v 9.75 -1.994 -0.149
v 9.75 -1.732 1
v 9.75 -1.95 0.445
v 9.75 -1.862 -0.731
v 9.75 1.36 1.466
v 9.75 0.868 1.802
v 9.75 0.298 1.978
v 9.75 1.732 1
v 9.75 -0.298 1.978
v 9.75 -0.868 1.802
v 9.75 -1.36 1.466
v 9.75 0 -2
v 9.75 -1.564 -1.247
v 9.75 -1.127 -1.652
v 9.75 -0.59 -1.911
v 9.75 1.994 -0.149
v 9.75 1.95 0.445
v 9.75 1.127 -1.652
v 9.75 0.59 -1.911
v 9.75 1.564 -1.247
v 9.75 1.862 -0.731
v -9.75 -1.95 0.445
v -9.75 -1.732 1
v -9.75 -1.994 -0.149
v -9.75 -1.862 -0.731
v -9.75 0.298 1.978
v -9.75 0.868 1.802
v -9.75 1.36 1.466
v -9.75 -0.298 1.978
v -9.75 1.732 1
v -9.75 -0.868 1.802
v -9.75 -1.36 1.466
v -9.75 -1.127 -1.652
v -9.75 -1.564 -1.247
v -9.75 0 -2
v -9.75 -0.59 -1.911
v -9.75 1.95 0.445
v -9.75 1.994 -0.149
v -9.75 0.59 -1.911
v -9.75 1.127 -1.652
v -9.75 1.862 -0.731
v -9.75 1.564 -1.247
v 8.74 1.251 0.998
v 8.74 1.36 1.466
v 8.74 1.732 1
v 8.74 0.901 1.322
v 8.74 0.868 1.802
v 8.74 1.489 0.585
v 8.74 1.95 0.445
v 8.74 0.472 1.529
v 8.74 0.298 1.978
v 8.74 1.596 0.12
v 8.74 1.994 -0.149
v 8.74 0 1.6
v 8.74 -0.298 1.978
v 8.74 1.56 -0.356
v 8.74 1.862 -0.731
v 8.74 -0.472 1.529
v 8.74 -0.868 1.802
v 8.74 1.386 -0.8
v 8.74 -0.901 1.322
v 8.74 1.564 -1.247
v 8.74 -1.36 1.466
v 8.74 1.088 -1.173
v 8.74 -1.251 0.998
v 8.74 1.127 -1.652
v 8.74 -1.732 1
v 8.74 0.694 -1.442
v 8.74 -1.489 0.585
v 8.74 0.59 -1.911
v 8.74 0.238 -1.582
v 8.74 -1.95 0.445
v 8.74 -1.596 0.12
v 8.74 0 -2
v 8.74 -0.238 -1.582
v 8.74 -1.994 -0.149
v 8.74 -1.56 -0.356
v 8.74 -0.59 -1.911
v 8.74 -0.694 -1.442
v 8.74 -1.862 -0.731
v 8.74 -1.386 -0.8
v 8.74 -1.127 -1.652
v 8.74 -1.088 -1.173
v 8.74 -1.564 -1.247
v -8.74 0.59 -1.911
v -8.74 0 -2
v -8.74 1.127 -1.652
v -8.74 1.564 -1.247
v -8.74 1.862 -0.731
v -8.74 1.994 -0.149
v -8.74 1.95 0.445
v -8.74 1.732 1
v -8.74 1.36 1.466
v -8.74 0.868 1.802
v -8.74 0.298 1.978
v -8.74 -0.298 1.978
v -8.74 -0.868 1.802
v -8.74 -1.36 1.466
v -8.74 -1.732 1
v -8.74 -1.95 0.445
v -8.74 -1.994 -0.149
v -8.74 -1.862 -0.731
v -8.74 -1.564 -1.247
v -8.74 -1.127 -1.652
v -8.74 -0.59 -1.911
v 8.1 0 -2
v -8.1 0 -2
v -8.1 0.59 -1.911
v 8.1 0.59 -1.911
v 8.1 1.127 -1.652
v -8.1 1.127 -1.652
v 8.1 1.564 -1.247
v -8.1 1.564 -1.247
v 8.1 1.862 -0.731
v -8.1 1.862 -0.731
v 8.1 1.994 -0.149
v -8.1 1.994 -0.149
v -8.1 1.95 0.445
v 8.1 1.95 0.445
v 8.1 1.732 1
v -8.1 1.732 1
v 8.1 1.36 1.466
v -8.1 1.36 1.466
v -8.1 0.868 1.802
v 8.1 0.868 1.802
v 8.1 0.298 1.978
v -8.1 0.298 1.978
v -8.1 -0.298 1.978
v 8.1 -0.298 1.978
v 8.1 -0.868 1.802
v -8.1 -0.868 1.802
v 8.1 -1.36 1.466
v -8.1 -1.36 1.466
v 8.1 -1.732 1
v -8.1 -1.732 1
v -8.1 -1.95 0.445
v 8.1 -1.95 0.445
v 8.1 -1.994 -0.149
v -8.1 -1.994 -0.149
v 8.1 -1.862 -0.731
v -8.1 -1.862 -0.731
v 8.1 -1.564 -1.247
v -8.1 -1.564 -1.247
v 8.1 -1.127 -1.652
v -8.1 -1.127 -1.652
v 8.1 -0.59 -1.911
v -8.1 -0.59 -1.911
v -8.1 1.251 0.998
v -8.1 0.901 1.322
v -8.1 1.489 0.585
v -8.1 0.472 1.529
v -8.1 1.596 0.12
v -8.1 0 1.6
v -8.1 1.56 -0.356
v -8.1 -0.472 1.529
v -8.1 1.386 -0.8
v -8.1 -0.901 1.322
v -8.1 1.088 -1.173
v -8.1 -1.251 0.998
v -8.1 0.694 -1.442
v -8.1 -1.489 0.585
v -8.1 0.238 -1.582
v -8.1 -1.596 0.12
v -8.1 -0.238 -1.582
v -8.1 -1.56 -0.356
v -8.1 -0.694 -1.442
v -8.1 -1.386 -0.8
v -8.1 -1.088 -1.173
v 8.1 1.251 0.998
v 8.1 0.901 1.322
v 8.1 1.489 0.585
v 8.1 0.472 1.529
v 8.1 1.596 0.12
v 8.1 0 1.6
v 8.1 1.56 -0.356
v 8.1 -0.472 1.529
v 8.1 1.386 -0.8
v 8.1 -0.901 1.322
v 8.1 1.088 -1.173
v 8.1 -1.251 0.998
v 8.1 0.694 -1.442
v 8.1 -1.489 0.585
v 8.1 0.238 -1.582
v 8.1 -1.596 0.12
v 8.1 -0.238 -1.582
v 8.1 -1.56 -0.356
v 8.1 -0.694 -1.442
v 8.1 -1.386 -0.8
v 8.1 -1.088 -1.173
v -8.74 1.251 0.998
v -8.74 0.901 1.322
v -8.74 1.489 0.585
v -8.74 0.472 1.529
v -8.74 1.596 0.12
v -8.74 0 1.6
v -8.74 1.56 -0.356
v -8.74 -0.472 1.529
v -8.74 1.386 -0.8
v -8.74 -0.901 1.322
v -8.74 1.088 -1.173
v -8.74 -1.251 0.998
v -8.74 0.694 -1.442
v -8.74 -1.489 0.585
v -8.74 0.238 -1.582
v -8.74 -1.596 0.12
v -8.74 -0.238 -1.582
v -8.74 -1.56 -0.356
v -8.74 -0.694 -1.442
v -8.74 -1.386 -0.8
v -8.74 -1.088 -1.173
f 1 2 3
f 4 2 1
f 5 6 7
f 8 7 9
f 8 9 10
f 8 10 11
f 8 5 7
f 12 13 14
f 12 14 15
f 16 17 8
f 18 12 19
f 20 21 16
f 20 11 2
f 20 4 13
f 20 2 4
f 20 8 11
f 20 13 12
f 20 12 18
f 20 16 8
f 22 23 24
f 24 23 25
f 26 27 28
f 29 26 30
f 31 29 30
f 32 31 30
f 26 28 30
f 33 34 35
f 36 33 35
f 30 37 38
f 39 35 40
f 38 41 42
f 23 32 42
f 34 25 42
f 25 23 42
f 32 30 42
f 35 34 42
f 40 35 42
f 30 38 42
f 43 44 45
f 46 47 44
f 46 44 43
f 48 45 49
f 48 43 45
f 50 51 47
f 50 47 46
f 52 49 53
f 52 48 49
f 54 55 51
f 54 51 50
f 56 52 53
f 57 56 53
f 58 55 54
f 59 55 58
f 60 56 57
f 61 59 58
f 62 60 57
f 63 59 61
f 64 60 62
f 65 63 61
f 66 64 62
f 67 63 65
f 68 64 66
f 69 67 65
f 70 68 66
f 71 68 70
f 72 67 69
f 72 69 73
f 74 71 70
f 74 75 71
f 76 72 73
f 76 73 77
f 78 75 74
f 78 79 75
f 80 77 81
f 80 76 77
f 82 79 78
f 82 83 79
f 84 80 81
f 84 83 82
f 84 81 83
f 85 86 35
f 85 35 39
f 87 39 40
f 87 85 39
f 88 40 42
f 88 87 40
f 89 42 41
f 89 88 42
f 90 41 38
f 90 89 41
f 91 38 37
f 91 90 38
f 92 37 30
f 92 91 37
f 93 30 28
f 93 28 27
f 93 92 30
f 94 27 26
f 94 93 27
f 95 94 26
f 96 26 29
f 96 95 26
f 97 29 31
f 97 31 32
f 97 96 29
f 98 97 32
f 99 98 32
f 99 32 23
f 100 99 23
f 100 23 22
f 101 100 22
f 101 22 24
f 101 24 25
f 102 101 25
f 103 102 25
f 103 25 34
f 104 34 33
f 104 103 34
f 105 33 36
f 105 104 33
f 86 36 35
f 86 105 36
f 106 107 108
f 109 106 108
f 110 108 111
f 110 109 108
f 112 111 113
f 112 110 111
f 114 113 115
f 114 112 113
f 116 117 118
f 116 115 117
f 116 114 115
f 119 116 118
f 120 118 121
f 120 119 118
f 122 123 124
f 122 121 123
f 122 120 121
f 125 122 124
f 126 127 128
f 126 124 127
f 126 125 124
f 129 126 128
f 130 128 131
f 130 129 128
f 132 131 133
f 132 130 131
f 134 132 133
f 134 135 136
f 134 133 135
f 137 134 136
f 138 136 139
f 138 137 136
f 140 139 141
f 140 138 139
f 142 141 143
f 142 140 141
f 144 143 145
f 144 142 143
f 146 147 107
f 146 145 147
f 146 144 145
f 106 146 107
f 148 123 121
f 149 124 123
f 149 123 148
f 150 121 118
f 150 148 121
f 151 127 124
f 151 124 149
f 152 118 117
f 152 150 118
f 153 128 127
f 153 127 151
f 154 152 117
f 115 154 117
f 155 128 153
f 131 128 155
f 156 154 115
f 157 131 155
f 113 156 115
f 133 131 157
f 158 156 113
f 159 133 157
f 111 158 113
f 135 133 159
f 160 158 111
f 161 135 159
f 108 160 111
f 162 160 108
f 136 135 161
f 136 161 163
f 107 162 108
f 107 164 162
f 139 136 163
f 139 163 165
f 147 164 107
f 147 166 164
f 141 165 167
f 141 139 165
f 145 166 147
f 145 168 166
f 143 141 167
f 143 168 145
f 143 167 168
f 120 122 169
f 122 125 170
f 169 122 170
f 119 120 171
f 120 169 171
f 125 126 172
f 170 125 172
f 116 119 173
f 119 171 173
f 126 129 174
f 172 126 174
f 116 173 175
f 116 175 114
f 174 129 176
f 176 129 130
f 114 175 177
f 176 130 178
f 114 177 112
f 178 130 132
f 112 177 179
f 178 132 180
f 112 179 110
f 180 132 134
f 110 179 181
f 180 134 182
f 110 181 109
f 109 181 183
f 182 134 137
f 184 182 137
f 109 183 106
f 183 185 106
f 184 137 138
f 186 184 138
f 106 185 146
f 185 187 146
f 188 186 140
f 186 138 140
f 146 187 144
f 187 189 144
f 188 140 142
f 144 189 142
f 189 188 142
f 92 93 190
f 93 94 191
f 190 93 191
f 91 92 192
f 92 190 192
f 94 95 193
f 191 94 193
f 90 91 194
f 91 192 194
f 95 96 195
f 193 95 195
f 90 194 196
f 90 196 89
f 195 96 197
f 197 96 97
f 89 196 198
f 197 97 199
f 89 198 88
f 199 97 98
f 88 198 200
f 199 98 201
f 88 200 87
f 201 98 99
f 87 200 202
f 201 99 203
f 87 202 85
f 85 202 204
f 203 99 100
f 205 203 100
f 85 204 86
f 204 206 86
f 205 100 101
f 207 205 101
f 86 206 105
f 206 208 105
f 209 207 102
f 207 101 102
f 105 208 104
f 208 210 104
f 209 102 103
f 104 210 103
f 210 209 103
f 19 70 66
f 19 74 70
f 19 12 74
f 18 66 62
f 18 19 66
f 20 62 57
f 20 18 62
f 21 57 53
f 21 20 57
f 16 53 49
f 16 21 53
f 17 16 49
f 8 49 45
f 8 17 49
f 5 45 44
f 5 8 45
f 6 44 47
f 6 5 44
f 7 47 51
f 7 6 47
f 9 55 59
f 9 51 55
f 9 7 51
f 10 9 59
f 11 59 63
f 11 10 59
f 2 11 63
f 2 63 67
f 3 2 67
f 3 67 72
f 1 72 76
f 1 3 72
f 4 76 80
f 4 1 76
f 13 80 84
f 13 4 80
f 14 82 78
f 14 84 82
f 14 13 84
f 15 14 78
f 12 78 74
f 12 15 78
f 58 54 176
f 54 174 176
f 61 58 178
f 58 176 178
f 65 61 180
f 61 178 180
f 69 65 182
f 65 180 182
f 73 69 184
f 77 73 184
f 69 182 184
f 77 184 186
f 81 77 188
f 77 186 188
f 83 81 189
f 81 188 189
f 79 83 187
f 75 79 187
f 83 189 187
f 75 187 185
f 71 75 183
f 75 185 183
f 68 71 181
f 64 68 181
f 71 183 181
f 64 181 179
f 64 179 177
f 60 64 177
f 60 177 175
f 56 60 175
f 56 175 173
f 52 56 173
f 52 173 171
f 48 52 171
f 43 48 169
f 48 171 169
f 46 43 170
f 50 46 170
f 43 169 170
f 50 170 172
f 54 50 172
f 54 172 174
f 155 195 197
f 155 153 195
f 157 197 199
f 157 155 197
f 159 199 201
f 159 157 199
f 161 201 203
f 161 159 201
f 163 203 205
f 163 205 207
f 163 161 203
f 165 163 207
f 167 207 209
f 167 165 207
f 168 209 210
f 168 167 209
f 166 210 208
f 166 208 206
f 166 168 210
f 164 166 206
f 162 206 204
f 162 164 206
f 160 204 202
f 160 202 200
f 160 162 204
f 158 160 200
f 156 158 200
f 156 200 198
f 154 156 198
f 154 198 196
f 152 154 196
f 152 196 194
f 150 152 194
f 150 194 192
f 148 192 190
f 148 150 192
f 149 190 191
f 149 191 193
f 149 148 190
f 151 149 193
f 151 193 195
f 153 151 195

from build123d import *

# Parameters (mm, degrees)
SKETCH1_R           = 2
BOSS_EXTRUDE1_DEPTH = 9.75
SKETCH2_W           = 0.64
SKETCH2_H           = 0.4


with BuildPart() as part:
    # Sketch1 → Boss-Extrude1 (new, symmetric)
    with BuildSketch(Plane(origin=(0, 0, 0), x_dir=(0, 0, -1), z_dir=(1, 0, 0))):
        Circle(SKETCH1_R)
    extrude(amount=BOSS_EXTRUDE1_DEPTH, both=True)

    # Sketch2 → Cut-Revolve1 (revolve, cut)
    with BuildSketch(Plane(origin=(0, 0, 0), x_dir=(1, 0, 0), z_dir=(0, 1, 0)), mode=Mode.PRIVATE) as cut_revolve1_sk:
        with Locations((-8.42, 1.8)):
            Rectangle(SKETCH2_W, SKETCH2_H)
    cut_revolve1 = revolve(cut_revolve1_sk.sketch.rotate(Axis((-10.725, 0, 0), (1, 0, 0)), 180), axis=Axis((-10.725, 0, 0), (1, 0, 0)), mode=Mode.SUBTRACT)

    # Mirror1: Cut-Revolve1 across plane
    add(cut_revolve1.mirror(Plane(origin=(0, 0, 0), x_dir=(0, 0, 1), z_dir=(1, 0, 0))), mode=Mode.SUBTRACT)


solid = part.part
